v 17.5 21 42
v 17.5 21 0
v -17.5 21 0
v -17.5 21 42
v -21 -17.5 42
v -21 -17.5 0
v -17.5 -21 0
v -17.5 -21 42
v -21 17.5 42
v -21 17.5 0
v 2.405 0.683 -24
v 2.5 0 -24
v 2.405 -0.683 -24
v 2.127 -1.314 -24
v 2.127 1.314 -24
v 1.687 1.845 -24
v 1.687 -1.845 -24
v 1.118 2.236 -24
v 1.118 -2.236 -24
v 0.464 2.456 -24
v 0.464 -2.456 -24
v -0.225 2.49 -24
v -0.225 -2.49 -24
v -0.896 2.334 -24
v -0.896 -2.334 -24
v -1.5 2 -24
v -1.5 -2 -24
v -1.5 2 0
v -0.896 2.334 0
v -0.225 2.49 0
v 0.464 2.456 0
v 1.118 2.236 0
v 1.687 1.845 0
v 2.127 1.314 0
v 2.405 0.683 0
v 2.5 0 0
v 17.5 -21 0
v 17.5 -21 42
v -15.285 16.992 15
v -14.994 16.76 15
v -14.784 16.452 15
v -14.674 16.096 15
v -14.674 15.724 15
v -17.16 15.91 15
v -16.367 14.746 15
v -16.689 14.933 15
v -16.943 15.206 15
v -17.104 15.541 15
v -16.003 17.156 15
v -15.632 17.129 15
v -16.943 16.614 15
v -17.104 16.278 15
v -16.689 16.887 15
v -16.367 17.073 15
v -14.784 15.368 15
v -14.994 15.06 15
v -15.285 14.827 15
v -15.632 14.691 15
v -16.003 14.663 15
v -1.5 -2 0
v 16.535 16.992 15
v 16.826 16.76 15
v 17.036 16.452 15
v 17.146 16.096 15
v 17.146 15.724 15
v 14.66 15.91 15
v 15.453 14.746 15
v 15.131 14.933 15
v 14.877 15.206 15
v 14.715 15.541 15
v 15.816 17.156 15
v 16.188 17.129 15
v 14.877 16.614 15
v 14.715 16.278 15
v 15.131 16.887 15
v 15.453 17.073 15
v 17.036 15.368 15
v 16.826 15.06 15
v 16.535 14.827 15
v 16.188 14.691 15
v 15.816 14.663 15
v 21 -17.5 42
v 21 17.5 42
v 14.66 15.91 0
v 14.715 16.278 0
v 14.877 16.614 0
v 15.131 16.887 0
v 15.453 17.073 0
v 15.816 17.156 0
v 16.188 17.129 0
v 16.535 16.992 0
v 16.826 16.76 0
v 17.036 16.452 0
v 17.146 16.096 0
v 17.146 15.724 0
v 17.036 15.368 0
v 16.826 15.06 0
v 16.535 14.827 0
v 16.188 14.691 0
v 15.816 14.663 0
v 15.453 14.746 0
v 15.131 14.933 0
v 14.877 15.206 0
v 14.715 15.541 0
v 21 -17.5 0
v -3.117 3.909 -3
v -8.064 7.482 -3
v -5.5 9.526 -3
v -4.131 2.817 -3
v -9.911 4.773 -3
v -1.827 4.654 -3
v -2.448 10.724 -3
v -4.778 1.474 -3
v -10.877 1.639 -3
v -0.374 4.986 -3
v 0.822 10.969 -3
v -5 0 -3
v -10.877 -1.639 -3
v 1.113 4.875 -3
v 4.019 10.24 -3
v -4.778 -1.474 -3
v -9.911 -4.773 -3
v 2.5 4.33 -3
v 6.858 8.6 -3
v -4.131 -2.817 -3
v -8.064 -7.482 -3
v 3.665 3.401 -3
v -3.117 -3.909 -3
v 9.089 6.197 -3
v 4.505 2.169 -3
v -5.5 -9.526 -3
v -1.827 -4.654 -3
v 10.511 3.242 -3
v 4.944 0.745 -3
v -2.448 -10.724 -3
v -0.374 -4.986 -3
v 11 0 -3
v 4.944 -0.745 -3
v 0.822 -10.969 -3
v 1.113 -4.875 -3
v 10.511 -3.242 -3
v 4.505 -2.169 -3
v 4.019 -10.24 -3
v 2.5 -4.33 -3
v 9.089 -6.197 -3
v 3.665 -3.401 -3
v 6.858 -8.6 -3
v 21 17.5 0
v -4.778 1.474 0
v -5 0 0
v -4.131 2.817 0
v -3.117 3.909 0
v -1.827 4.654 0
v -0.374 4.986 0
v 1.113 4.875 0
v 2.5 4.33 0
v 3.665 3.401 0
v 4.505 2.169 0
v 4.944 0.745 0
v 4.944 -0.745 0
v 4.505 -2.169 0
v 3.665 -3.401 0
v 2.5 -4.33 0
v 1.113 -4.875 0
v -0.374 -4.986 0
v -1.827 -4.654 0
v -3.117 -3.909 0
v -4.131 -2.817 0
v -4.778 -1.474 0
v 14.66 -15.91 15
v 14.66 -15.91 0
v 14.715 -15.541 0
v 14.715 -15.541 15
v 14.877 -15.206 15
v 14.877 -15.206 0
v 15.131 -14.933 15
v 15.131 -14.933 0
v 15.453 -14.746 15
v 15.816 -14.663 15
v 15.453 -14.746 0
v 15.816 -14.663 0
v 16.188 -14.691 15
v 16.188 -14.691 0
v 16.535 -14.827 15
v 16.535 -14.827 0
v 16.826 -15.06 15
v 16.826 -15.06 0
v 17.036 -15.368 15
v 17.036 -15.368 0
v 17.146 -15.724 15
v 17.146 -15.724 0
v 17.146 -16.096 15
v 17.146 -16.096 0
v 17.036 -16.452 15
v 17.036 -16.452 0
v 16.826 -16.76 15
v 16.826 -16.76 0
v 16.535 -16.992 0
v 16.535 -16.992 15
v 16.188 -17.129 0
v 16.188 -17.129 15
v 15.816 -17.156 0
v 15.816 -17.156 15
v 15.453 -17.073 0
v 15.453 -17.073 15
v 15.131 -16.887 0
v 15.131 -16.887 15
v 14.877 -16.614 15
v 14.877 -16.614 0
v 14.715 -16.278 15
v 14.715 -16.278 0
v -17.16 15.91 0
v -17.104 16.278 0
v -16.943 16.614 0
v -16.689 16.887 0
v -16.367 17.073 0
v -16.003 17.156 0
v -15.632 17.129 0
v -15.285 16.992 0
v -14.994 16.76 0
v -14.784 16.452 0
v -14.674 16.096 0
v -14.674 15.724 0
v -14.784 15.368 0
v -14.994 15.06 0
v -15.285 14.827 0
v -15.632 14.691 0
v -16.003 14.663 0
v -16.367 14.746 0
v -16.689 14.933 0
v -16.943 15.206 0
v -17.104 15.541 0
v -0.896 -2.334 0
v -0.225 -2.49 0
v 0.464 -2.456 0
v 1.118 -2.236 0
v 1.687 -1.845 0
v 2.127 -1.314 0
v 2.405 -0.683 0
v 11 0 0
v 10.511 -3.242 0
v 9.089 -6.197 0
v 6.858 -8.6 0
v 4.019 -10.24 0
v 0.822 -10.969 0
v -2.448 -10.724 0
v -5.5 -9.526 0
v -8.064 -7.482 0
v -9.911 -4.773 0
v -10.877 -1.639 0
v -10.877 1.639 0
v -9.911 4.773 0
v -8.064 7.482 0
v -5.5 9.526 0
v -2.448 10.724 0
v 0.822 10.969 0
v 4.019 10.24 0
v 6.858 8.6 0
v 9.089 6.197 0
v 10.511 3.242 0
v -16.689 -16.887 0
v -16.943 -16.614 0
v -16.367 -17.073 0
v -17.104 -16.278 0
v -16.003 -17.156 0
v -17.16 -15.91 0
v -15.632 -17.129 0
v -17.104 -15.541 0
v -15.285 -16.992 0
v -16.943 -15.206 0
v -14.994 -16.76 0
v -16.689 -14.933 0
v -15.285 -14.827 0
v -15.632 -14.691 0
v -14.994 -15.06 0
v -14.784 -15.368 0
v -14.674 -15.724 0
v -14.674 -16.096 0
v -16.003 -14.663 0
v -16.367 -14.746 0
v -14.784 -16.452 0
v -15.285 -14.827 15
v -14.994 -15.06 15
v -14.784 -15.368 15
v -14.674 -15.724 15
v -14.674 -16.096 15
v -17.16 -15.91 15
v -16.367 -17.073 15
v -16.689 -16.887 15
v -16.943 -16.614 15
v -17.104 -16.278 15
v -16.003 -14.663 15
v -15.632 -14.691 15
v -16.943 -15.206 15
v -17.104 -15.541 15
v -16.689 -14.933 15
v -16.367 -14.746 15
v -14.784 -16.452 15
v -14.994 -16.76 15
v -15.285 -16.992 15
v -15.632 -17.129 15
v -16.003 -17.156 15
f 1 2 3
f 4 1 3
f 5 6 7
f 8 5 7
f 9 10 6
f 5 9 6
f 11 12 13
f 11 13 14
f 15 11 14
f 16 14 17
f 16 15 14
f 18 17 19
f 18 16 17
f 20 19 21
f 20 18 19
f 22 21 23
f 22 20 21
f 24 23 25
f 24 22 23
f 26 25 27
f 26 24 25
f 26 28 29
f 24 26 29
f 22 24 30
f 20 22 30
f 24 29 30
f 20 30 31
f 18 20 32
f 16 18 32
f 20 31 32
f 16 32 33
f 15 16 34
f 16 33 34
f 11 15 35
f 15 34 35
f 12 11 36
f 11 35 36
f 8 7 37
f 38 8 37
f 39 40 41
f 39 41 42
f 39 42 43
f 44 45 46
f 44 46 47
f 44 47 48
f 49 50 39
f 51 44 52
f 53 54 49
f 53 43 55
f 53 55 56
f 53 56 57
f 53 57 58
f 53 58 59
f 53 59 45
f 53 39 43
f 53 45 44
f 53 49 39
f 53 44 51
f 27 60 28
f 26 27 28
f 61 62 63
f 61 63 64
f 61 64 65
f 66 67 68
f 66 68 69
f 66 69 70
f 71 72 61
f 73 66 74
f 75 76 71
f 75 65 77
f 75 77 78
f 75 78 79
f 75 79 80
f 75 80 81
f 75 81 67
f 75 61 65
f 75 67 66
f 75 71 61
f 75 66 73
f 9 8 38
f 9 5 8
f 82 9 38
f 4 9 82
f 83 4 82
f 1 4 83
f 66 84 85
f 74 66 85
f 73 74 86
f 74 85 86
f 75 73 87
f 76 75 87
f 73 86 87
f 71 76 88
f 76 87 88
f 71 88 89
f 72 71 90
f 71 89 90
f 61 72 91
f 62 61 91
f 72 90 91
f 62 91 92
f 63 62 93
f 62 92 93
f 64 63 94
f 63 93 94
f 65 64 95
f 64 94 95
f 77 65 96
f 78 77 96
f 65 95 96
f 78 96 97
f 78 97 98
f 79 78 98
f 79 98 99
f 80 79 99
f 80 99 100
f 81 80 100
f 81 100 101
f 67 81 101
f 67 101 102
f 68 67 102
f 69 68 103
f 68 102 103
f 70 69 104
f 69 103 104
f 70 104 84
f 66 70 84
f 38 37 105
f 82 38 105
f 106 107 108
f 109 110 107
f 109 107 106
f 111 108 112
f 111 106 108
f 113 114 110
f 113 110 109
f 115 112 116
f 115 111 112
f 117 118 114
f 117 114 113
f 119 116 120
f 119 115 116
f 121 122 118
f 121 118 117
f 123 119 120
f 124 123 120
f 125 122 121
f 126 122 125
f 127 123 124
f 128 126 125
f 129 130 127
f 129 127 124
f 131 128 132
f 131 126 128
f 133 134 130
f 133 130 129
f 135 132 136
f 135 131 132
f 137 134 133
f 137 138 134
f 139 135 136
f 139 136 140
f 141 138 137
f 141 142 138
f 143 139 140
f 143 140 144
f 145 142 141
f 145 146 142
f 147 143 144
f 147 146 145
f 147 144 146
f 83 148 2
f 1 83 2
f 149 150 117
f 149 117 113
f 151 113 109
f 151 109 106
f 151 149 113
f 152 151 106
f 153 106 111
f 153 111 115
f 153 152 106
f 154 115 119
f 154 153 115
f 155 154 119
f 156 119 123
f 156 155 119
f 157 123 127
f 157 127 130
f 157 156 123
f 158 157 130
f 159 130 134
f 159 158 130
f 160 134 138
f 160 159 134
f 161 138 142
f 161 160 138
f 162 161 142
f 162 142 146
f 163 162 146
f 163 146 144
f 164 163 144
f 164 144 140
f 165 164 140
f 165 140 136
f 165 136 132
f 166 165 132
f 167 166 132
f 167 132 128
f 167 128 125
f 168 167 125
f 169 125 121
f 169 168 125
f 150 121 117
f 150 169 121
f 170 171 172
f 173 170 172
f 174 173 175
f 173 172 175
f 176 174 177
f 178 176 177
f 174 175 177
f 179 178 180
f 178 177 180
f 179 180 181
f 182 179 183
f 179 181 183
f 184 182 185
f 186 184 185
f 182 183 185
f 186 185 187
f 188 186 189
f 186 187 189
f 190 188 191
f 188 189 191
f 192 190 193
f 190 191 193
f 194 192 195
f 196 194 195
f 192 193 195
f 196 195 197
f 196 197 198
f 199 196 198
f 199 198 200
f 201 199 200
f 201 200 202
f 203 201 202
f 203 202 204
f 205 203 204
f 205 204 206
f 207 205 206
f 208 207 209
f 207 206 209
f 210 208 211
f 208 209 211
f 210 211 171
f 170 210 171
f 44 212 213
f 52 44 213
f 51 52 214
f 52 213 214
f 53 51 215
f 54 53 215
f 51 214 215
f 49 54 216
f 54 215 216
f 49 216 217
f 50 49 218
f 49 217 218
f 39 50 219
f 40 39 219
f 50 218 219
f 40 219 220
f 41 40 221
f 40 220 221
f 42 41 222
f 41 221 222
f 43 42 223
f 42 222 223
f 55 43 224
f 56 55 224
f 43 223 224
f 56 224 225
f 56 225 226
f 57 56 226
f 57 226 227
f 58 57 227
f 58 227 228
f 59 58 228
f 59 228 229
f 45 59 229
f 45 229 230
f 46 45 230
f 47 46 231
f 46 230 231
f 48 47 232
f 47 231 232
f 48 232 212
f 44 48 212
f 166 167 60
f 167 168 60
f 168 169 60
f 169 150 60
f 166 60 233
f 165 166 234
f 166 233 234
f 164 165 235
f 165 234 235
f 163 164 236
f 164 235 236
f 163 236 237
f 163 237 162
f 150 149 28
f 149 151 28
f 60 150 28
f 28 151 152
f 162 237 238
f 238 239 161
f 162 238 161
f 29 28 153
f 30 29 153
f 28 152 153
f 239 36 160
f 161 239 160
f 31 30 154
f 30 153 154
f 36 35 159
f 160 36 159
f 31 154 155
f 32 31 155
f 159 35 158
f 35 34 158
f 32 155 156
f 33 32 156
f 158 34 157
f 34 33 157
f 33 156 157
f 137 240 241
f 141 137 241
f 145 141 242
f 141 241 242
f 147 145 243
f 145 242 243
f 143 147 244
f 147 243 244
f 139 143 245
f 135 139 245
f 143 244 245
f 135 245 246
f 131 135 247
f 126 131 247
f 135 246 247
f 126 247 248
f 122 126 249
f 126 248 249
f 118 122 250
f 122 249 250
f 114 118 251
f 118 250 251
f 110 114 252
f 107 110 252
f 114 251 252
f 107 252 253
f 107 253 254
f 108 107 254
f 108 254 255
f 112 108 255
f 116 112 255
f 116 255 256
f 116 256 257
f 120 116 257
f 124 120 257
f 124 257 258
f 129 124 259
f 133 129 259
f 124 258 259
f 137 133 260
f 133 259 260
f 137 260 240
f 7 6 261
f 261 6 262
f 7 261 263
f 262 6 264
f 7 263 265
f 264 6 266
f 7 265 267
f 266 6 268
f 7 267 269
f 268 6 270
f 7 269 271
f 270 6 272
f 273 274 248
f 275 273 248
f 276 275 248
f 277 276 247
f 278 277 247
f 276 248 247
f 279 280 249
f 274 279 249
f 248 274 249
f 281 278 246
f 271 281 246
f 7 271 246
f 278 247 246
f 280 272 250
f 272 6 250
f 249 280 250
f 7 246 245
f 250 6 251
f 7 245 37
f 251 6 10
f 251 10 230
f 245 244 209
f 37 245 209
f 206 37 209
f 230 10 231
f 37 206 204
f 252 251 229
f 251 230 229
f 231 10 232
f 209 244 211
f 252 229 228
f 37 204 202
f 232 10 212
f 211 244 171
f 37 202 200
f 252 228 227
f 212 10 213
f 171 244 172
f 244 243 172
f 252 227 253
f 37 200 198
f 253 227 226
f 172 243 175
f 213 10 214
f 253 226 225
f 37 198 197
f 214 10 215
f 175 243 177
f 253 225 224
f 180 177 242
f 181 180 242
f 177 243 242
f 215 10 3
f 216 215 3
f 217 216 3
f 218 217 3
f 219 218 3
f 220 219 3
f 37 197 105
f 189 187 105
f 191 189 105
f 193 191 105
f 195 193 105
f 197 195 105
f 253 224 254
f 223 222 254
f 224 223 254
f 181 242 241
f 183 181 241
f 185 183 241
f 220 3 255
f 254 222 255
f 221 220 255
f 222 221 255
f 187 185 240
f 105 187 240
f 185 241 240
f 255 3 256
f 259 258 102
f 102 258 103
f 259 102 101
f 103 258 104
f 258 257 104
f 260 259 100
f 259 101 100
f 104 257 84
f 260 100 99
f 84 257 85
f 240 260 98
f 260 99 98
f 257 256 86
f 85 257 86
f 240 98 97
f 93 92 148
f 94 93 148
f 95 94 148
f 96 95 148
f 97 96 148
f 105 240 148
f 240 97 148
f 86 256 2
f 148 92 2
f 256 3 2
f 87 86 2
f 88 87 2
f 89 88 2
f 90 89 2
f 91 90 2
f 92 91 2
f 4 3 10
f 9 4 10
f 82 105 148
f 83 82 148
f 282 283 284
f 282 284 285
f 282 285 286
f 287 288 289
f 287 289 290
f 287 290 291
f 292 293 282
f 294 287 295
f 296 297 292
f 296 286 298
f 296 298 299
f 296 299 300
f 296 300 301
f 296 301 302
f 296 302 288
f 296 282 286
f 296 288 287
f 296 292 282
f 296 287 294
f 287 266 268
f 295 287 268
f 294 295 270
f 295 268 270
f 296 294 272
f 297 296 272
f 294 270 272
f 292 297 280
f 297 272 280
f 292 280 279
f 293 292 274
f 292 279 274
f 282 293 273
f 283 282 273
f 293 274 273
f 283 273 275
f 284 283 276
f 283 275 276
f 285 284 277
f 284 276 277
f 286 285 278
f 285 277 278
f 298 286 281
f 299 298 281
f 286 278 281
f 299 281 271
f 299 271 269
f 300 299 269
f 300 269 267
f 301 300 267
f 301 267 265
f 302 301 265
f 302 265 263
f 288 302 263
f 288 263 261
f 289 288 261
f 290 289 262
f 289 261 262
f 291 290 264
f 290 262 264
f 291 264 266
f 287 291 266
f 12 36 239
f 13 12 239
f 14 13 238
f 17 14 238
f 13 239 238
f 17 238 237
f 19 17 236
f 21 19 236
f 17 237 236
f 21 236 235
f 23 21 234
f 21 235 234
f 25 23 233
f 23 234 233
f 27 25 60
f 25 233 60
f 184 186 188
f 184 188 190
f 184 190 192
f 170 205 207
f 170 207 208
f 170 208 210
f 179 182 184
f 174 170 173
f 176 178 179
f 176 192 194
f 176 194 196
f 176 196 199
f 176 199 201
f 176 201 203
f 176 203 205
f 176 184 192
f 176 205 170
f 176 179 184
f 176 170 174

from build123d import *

# Parameters (mm, degrees)
SALIENTE_EXTRUIR1_DEPTH = 42
CROQUIS2_R              = 11
CROQUIS2_R_2            = 5
SALIENTE_EXTRUIR3_DEPTH = 3
SALIENTE_EXTRUIR4_DEPTH = 24
CROQUIS7_R              = 1.25
CORTAR_EXTRUIR2_DEPTH   = 15


with BuildPart() as part:
    # Croquis1 → Saliente-Extruir1 (new body)
    with BuildSketch(Plane.XY):
        Polygon((-17.5, -21), (17.5, -21), (21, -17.5), (21, 17.5), (17.5, 21), (-17.5, 21), (-21, 17.5), (-21, -17.5), align=None)
    extrude(amount=SALIENTE_EXTRUIR1_DEPTH)

    # Croquis2 → Saliente-Extruir3 (add)
    with BuildSketch(Plane(origin=(0, 0, 0), x_dir=(-1, 0, 0), z_dir=(0, 0, -1))):
        with Locations(Location((0, 0, 0), (0, 0, 180))):
            Circle(CROQUIS2_R)
        Circle(CROQUIS2_R_2, mode=Mode.SUBTRACT)
    extrude(amount=SALIENTE_EXTRUIR3_DEPTH)

    # Croquis3 → Saliente-Extruir4 (add)
    with BuildSketch(Plane(origin=(0, 0, 0), x_dir=(-1, 0, 0), z_dir=(0, 0, -1))):
        with BuildLine():
            Line((1.5, 0), (-2.5, 0))
            ThreePointArc((-2.5, 0), (-1.118033989, -2.236067977), (1.5, -2))
            Line((1.5, -2), (1.5, 0))
        make_face()
        with BuildLine():
            ThreePointArc((1.5, 2), (-1.118033989, 2.236067977), (-2.5, 0))
            Line((-2.5, 0), (1.5, 0))
            Line((1.5, 0), (1.5, 2))
        make_face()
    extrude(amount=SALIENTE_EXTRUIR4_DEPTH)

    # Croquis7 → Cortar-Extruir2 (cut)
    with BuildSketch(Plane(origin=(0, 0, 0), x_dir=(-1, 0, 0), z_dir=(0, 0, -1))):
        with Locations((-15.909902577, 15.909902577)):
            Circle(CROQUIS7_R)
        with Locations((-15.909902577, -15.909902577)):
            Circle(CROQUIS7_R)
        with Locations((15.909902577, -15.909902577)):
            Circle(CROQUIS7_R)
        with Locations((15.909902577, 15.909902577)):
            Circle(CROQUIS7_R)
    extrude(amount=-CORTAR_EXTRUIR2_DEPTH, mode=Mode.SUBTRACT)


solid = part.part
